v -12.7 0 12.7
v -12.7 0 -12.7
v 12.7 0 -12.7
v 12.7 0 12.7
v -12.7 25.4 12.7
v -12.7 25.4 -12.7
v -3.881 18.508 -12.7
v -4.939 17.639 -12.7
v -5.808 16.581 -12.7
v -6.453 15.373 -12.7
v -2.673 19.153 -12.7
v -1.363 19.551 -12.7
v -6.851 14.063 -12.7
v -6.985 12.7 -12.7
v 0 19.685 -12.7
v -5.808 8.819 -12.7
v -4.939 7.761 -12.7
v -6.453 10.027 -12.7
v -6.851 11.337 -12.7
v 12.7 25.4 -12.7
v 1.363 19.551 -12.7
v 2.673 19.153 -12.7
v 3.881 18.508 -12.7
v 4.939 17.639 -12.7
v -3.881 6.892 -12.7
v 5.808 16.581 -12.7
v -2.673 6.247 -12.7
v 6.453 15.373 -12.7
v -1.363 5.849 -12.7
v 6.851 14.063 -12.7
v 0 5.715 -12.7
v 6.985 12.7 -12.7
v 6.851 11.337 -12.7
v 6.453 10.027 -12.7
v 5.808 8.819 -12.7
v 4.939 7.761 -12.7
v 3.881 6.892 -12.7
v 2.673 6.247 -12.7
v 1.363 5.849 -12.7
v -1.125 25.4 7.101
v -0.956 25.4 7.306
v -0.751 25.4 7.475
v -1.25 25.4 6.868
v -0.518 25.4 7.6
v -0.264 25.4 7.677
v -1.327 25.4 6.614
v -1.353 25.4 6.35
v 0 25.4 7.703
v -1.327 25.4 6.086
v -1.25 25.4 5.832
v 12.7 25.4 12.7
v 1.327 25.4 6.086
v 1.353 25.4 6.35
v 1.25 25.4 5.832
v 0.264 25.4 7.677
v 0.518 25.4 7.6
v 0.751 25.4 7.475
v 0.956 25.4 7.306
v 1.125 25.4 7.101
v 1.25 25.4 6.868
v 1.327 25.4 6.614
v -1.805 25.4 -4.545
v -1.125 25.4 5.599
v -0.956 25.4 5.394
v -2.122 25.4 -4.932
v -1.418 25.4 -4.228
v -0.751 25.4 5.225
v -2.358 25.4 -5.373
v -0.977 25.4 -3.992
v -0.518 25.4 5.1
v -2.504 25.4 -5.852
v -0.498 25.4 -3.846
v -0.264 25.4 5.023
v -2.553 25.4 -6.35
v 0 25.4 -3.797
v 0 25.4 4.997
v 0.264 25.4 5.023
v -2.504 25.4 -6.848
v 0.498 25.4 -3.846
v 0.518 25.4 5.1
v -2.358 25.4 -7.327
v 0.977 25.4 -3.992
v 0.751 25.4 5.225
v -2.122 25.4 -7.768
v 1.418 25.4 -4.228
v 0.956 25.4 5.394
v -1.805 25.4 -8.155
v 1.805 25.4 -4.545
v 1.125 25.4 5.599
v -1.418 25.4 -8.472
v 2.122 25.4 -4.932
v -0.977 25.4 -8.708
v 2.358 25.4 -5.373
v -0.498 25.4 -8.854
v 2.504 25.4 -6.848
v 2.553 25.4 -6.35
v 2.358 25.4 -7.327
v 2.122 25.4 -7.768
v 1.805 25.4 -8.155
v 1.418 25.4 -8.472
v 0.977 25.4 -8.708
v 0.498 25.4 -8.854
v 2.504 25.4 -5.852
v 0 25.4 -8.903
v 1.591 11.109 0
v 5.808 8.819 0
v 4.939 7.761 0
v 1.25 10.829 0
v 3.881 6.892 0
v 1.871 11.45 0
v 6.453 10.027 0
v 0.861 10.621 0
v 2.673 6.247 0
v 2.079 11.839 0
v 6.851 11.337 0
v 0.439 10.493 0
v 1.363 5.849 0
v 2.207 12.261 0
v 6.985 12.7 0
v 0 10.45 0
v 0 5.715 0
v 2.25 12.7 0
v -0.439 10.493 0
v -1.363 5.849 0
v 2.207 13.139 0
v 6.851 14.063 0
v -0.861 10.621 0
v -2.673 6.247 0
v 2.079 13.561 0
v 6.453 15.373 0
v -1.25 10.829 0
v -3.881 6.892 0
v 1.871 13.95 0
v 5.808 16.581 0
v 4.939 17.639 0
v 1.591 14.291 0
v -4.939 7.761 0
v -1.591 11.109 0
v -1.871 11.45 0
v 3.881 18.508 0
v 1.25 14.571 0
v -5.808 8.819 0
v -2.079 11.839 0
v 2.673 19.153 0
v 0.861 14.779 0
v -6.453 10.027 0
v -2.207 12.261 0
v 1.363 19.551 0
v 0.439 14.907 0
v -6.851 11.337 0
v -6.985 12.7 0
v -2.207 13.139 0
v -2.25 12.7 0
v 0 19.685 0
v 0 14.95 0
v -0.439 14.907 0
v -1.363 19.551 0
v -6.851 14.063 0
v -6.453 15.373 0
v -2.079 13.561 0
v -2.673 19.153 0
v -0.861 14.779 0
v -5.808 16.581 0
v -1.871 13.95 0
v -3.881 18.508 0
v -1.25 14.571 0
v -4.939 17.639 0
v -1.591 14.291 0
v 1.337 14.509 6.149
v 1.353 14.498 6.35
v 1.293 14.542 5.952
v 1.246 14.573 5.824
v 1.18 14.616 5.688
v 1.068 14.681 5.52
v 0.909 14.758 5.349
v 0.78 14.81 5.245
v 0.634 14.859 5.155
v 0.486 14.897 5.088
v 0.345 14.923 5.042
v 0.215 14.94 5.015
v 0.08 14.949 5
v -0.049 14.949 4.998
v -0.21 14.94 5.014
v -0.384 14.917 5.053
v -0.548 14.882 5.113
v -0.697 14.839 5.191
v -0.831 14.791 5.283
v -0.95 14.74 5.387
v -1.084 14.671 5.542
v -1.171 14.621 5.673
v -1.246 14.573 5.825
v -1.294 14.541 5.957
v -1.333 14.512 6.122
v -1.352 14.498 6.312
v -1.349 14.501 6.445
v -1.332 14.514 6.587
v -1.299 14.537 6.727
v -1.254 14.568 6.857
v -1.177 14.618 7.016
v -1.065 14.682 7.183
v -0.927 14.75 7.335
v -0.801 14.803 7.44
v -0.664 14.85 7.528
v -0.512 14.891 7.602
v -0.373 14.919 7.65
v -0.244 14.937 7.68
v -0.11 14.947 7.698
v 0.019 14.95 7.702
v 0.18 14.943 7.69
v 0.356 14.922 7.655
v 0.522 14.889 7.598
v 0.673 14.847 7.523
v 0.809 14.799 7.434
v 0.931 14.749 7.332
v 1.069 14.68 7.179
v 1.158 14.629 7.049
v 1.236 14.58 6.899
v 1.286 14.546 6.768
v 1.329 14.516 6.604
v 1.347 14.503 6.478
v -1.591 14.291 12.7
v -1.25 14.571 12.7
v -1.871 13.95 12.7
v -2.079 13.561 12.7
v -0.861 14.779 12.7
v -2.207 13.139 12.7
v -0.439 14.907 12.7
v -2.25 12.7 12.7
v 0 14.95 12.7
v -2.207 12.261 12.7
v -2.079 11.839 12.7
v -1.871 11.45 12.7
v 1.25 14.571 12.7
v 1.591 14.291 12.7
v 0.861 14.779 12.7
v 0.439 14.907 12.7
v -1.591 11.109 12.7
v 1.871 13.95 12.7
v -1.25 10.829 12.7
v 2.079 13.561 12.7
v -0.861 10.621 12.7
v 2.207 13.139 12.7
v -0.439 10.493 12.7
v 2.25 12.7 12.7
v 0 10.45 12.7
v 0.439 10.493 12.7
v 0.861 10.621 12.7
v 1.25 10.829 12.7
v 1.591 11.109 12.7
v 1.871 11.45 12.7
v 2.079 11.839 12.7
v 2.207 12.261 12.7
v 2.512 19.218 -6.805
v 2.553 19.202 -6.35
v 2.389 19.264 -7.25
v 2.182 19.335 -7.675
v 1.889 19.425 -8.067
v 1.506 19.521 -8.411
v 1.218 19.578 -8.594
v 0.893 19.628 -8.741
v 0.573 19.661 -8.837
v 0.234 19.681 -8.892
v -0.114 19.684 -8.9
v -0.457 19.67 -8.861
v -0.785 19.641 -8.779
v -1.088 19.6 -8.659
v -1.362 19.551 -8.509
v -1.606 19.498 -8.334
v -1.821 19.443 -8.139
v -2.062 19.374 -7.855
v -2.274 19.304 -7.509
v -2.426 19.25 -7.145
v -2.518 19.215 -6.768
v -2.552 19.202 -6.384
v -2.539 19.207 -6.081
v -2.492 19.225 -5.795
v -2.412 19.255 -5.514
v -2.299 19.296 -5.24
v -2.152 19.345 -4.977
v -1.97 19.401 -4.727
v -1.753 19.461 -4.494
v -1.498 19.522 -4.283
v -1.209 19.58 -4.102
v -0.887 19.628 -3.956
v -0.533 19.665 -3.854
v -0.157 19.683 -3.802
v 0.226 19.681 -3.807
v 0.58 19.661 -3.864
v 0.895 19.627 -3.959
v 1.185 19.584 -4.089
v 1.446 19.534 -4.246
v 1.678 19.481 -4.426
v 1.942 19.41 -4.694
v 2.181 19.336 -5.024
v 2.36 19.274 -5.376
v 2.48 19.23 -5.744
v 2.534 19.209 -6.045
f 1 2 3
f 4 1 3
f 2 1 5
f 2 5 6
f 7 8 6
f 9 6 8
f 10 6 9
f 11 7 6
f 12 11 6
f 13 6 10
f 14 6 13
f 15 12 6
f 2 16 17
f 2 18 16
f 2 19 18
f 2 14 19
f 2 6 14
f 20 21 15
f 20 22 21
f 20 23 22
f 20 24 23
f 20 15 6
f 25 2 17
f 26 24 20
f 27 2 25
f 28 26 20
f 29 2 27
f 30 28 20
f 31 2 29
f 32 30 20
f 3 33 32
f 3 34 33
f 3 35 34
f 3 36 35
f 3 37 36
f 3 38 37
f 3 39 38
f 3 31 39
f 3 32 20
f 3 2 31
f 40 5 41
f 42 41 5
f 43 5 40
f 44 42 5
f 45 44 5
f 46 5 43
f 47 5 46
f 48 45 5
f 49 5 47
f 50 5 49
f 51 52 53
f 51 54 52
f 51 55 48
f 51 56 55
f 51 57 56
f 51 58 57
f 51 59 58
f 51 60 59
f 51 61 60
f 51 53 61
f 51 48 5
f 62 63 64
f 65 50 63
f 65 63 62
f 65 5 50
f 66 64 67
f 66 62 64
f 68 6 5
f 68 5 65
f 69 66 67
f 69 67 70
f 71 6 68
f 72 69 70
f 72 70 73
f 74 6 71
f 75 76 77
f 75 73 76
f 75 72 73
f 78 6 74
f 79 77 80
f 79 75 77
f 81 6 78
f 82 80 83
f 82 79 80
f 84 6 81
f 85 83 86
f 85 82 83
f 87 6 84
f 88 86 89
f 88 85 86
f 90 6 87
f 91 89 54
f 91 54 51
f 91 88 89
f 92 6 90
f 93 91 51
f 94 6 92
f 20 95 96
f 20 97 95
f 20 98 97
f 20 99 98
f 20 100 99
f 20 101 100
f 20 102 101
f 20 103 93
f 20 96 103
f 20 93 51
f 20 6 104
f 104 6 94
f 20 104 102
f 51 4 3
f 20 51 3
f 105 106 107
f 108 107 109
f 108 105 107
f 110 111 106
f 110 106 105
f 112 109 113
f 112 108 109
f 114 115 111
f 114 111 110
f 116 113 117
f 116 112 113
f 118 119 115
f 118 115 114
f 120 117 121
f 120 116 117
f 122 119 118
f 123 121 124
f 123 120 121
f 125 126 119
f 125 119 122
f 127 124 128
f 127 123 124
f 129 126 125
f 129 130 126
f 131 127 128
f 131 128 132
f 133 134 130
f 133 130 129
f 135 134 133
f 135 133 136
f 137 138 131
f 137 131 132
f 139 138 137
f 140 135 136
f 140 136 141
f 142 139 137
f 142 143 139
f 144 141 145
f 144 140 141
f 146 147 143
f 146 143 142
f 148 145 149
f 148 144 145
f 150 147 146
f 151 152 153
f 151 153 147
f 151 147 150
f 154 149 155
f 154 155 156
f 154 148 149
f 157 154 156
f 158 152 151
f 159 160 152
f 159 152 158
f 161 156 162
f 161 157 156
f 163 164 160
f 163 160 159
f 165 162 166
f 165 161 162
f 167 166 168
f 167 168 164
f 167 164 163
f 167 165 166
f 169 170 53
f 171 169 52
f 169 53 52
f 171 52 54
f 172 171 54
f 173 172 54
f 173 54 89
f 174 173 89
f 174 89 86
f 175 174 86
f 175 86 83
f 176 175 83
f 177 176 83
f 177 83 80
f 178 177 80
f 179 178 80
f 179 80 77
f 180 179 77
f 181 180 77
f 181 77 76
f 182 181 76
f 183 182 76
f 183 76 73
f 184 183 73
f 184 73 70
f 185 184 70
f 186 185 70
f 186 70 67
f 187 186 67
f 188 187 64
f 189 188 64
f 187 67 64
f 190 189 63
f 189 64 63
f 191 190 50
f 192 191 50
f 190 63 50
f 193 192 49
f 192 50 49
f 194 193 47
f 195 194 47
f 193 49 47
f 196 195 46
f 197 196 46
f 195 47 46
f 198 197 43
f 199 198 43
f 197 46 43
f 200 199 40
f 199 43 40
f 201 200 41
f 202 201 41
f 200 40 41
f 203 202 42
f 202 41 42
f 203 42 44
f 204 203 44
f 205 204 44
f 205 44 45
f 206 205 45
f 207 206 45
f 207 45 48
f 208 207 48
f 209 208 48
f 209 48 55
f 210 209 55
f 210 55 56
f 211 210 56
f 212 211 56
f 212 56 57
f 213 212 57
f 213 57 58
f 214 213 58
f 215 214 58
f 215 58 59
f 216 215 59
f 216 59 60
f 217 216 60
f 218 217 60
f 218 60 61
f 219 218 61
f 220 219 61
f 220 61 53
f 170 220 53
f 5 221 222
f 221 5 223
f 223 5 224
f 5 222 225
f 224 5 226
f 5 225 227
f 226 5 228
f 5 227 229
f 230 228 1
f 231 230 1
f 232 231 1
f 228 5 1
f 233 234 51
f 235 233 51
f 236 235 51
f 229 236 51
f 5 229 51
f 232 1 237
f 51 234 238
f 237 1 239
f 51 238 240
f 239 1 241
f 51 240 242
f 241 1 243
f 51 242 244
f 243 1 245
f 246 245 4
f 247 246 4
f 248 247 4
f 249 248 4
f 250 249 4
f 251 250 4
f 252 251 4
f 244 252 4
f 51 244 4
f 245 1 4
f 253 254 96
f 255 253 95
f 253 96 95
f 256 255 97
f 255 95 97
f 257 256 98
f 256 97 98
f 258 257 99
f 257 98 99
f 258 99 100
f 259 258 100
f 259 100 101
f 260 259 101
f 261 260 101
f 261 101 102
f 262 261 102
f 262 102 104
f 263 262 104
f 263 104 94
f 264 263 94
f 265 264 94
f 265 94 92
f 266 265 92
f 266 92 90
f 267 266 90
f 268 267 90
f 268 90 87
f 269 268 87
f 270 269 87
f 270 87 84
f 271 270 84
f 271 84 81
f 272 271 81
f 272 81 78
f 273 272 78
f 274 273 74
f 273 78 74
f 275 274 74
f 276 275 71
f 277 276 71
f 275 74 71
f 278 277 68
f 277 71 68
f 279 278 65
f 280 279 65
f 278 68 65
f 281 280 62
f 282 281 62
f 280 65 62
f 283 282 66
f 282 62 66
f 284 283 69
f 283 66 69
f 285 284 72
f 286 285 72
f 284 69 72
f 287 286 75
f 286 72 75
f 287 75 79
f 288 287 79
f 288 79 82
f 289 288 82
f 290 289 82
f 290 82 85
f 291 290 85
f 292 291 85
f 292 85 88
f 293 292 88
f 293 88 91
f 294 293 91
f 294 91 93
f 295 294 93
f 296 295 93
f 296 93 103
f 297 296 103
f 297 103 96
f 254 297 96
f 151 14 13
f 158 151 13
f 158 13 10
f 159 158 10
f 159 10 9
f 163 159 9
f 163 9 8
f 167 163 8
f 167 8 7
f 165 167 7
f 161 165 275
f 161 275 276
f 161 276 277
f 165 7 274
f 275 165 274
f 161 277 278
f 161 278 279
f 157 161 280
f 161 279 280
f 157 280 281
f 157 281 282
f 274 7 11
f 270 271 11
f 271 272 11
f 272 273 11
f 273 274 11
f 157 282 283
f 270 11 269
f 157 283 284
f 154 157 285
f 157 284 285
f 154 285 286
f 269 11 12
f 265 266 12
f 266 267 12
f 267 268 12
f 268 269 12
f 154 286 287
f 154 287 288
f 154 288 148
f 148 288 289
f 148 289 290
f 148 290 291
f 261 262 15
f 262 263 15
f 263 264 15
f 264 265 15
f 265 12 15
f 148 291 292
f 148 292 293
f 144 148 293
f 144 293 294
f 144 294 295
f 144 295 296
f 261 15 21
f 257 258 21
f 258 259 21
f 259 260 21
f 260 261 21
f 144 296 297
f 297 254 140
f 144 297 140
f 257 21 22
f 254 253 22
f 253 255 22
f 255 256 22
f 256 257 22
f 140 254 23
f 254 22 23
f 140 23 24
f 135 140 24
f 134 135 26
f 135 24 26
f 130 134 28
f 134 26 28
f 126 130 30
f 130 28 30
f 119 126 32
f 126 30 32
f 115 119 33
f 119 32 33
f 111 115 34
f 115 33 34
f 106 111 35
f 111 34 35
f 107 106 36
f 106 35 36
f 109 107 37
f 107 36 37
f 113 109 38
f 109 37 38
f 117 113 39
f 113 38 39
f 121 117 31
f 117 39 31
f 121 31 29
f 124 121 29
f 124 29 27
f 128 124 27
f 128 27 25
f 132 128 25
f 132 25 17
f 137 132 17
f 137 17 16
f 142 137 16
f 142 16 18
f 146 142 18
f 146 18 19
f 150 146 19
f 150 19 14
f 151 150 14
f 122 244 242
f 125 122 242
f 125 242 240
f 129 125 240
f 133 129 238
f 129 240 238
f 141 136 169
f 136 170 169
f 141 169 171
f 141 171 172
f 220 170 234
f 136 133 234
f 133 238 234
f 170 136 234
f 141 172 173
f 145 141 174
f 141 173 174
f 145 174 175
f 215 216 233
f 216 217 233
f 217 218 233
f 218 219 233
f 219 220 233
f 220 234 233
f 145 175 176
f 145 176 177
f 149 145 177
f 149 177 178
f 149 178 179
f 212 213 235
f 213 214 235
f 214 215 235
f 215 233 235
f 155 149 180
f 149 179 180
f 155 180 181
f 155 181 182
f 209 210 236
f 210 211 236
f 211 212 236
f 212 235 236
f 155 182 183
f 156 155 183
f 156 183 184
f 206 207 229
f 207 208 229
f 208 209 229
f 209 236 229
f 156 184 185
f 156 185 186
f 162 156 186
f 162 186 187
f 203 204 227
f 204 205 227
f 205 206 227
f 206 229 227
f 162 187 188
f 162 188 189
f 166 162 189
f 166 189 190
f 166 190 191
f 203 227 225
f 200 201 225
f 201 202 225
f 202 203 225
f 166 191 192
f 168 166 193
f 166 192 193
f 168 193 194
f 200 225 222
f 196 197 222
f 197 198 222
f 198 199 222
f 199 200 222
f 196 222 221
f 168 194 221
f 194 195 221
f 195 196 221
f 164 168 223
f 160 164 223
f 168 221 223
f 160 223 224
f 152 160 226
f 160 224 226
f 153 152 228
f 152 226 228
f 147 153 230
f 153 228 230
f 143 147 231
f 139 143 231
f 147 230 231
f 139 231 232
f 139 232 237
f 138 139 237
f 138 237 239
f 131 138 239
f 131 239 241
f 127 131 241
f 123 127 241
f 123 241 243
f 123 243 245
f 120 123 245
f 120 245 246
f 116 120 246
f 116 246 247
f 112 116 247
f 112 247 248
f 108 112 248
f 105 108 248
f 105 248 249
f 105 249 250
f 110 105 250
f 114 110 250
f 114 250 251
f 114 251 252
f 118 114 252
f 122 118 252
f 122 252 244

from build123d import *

# Parameters (mm, degrees)
SKETCH1_W                    = 25.4
SKETCH1_H                    = 25.4
BOSS_EXTRUDE1_DEPTH          = 25.4
SKETCH2_R                    = 2.25
CUT_EXTRUDE1_DEPTH           = 12.7
SKETCH3_R                    = 6.985
CUT_EXTRUDE2_DEPTH           = 12.7
F_6_32_TAPPED_HOLE1_REACH    = 33.109
F_6_32_TAPPED_HOLE1_BORE_R   = 1.35255
F_1_4_20_TAPPED_HOLE2_REACH  = 33.109
F_1_4_20_TAPPED_HOLE2_BORE_R = 2.5527


with BuildPart() as part:
    # Sketch1 → Boss-Extrude1 (new body)
    with BuildSketch(Plane(origin=(0, 0, 0), x_dir=(1, 0, 0), z_dir=(0, 1, 0))):
        Rectangle(SKETCH1_W, SKETCH1_H)
    extrude(amount=BOSS_EXTRUDE1_DEPTH)

    # Sketch2 → Cut-Extrude1 (cut)
    with BuildSketch(Plane.XY.offset(12.7)):
        with Locations((0, 12.7)):
            Circle(SKETCH2_R)
    extrude(amount=-CUT_EXTRUDE1_DEPTH, mode=Mode.SUBTRACT)

    # Sketch3 → Cut-Extrude2 (cut)
    with BuildSketch(Plane(origin=(0, 0, -12.7), x_dir=(-1, 0, 0), z_dir=(0, 0, -1))):
        with Locations((0, 12.7)):
            Circle(SKETCH3_R)
    extrude(amount=-CUT_EXTRUDE2_DEPTH, mode=Mode.SUBTRACT)

    # #6-32 Tapped Hole1 bore → #6-32 Tapped Hole1 (cut, up to next)
    with BuildSketch(Plane(origin=(0, 25.4, 0), x_dir=(1, 0, 0), z_dir=(0, 1, 0)), mode=Mode.PRIVATE) as f_6_32_tapped_hole1_sk1:
        with Locations((0, -6.35)):
            Circle(F_6_32_TAPPED_HOLE1_BORE_R)
    f_6_32_tapped_hole1_tool1 = extrude(f_6_32_tapped_hole1_sk1.sketch, amount=-F_6_32_TAPPED_HOLE1_REACH, mode=Mode.PRIVATE) & part.part
    add(f_6_32_tapped_hole1_tool1.solids().sort_by_distance((0, 25.4, 6.35))[0], mode=Mode.SUBTRACT)

    # 1/4-20 Tapped Hole2 bore → 1/4-20 Tapped Hole2 (cut, up to next)
    with BuildSketch(Plane(origin=(0, 25.4, 0), x_dir=(1, 0, 0), z_dir=(0, 1, 0)), mode=Mode.PRIVATE) as f_1_4_20_tapped_hole2_sk1:
        with Locations((0, 6.35)):
            Circle(F_1_4_20_TAPPED_HOLE2_BORE_R)
    f_1_4_20_tapped_hole2_tool1 = extrude(f_1_4_20_tapped_hole2_sk1.sketch, amount=-F_1_4_20_TAPPED_HOLE2_REACH, mode=Mode.PRIVATE) & part.part
    add(f_1_4_20_tapped_hole2_tool1.solids().sort_by_distance((0, 25.4, -6.35))[0], mode=Mode.SUBTRACT)


solid = part.part
